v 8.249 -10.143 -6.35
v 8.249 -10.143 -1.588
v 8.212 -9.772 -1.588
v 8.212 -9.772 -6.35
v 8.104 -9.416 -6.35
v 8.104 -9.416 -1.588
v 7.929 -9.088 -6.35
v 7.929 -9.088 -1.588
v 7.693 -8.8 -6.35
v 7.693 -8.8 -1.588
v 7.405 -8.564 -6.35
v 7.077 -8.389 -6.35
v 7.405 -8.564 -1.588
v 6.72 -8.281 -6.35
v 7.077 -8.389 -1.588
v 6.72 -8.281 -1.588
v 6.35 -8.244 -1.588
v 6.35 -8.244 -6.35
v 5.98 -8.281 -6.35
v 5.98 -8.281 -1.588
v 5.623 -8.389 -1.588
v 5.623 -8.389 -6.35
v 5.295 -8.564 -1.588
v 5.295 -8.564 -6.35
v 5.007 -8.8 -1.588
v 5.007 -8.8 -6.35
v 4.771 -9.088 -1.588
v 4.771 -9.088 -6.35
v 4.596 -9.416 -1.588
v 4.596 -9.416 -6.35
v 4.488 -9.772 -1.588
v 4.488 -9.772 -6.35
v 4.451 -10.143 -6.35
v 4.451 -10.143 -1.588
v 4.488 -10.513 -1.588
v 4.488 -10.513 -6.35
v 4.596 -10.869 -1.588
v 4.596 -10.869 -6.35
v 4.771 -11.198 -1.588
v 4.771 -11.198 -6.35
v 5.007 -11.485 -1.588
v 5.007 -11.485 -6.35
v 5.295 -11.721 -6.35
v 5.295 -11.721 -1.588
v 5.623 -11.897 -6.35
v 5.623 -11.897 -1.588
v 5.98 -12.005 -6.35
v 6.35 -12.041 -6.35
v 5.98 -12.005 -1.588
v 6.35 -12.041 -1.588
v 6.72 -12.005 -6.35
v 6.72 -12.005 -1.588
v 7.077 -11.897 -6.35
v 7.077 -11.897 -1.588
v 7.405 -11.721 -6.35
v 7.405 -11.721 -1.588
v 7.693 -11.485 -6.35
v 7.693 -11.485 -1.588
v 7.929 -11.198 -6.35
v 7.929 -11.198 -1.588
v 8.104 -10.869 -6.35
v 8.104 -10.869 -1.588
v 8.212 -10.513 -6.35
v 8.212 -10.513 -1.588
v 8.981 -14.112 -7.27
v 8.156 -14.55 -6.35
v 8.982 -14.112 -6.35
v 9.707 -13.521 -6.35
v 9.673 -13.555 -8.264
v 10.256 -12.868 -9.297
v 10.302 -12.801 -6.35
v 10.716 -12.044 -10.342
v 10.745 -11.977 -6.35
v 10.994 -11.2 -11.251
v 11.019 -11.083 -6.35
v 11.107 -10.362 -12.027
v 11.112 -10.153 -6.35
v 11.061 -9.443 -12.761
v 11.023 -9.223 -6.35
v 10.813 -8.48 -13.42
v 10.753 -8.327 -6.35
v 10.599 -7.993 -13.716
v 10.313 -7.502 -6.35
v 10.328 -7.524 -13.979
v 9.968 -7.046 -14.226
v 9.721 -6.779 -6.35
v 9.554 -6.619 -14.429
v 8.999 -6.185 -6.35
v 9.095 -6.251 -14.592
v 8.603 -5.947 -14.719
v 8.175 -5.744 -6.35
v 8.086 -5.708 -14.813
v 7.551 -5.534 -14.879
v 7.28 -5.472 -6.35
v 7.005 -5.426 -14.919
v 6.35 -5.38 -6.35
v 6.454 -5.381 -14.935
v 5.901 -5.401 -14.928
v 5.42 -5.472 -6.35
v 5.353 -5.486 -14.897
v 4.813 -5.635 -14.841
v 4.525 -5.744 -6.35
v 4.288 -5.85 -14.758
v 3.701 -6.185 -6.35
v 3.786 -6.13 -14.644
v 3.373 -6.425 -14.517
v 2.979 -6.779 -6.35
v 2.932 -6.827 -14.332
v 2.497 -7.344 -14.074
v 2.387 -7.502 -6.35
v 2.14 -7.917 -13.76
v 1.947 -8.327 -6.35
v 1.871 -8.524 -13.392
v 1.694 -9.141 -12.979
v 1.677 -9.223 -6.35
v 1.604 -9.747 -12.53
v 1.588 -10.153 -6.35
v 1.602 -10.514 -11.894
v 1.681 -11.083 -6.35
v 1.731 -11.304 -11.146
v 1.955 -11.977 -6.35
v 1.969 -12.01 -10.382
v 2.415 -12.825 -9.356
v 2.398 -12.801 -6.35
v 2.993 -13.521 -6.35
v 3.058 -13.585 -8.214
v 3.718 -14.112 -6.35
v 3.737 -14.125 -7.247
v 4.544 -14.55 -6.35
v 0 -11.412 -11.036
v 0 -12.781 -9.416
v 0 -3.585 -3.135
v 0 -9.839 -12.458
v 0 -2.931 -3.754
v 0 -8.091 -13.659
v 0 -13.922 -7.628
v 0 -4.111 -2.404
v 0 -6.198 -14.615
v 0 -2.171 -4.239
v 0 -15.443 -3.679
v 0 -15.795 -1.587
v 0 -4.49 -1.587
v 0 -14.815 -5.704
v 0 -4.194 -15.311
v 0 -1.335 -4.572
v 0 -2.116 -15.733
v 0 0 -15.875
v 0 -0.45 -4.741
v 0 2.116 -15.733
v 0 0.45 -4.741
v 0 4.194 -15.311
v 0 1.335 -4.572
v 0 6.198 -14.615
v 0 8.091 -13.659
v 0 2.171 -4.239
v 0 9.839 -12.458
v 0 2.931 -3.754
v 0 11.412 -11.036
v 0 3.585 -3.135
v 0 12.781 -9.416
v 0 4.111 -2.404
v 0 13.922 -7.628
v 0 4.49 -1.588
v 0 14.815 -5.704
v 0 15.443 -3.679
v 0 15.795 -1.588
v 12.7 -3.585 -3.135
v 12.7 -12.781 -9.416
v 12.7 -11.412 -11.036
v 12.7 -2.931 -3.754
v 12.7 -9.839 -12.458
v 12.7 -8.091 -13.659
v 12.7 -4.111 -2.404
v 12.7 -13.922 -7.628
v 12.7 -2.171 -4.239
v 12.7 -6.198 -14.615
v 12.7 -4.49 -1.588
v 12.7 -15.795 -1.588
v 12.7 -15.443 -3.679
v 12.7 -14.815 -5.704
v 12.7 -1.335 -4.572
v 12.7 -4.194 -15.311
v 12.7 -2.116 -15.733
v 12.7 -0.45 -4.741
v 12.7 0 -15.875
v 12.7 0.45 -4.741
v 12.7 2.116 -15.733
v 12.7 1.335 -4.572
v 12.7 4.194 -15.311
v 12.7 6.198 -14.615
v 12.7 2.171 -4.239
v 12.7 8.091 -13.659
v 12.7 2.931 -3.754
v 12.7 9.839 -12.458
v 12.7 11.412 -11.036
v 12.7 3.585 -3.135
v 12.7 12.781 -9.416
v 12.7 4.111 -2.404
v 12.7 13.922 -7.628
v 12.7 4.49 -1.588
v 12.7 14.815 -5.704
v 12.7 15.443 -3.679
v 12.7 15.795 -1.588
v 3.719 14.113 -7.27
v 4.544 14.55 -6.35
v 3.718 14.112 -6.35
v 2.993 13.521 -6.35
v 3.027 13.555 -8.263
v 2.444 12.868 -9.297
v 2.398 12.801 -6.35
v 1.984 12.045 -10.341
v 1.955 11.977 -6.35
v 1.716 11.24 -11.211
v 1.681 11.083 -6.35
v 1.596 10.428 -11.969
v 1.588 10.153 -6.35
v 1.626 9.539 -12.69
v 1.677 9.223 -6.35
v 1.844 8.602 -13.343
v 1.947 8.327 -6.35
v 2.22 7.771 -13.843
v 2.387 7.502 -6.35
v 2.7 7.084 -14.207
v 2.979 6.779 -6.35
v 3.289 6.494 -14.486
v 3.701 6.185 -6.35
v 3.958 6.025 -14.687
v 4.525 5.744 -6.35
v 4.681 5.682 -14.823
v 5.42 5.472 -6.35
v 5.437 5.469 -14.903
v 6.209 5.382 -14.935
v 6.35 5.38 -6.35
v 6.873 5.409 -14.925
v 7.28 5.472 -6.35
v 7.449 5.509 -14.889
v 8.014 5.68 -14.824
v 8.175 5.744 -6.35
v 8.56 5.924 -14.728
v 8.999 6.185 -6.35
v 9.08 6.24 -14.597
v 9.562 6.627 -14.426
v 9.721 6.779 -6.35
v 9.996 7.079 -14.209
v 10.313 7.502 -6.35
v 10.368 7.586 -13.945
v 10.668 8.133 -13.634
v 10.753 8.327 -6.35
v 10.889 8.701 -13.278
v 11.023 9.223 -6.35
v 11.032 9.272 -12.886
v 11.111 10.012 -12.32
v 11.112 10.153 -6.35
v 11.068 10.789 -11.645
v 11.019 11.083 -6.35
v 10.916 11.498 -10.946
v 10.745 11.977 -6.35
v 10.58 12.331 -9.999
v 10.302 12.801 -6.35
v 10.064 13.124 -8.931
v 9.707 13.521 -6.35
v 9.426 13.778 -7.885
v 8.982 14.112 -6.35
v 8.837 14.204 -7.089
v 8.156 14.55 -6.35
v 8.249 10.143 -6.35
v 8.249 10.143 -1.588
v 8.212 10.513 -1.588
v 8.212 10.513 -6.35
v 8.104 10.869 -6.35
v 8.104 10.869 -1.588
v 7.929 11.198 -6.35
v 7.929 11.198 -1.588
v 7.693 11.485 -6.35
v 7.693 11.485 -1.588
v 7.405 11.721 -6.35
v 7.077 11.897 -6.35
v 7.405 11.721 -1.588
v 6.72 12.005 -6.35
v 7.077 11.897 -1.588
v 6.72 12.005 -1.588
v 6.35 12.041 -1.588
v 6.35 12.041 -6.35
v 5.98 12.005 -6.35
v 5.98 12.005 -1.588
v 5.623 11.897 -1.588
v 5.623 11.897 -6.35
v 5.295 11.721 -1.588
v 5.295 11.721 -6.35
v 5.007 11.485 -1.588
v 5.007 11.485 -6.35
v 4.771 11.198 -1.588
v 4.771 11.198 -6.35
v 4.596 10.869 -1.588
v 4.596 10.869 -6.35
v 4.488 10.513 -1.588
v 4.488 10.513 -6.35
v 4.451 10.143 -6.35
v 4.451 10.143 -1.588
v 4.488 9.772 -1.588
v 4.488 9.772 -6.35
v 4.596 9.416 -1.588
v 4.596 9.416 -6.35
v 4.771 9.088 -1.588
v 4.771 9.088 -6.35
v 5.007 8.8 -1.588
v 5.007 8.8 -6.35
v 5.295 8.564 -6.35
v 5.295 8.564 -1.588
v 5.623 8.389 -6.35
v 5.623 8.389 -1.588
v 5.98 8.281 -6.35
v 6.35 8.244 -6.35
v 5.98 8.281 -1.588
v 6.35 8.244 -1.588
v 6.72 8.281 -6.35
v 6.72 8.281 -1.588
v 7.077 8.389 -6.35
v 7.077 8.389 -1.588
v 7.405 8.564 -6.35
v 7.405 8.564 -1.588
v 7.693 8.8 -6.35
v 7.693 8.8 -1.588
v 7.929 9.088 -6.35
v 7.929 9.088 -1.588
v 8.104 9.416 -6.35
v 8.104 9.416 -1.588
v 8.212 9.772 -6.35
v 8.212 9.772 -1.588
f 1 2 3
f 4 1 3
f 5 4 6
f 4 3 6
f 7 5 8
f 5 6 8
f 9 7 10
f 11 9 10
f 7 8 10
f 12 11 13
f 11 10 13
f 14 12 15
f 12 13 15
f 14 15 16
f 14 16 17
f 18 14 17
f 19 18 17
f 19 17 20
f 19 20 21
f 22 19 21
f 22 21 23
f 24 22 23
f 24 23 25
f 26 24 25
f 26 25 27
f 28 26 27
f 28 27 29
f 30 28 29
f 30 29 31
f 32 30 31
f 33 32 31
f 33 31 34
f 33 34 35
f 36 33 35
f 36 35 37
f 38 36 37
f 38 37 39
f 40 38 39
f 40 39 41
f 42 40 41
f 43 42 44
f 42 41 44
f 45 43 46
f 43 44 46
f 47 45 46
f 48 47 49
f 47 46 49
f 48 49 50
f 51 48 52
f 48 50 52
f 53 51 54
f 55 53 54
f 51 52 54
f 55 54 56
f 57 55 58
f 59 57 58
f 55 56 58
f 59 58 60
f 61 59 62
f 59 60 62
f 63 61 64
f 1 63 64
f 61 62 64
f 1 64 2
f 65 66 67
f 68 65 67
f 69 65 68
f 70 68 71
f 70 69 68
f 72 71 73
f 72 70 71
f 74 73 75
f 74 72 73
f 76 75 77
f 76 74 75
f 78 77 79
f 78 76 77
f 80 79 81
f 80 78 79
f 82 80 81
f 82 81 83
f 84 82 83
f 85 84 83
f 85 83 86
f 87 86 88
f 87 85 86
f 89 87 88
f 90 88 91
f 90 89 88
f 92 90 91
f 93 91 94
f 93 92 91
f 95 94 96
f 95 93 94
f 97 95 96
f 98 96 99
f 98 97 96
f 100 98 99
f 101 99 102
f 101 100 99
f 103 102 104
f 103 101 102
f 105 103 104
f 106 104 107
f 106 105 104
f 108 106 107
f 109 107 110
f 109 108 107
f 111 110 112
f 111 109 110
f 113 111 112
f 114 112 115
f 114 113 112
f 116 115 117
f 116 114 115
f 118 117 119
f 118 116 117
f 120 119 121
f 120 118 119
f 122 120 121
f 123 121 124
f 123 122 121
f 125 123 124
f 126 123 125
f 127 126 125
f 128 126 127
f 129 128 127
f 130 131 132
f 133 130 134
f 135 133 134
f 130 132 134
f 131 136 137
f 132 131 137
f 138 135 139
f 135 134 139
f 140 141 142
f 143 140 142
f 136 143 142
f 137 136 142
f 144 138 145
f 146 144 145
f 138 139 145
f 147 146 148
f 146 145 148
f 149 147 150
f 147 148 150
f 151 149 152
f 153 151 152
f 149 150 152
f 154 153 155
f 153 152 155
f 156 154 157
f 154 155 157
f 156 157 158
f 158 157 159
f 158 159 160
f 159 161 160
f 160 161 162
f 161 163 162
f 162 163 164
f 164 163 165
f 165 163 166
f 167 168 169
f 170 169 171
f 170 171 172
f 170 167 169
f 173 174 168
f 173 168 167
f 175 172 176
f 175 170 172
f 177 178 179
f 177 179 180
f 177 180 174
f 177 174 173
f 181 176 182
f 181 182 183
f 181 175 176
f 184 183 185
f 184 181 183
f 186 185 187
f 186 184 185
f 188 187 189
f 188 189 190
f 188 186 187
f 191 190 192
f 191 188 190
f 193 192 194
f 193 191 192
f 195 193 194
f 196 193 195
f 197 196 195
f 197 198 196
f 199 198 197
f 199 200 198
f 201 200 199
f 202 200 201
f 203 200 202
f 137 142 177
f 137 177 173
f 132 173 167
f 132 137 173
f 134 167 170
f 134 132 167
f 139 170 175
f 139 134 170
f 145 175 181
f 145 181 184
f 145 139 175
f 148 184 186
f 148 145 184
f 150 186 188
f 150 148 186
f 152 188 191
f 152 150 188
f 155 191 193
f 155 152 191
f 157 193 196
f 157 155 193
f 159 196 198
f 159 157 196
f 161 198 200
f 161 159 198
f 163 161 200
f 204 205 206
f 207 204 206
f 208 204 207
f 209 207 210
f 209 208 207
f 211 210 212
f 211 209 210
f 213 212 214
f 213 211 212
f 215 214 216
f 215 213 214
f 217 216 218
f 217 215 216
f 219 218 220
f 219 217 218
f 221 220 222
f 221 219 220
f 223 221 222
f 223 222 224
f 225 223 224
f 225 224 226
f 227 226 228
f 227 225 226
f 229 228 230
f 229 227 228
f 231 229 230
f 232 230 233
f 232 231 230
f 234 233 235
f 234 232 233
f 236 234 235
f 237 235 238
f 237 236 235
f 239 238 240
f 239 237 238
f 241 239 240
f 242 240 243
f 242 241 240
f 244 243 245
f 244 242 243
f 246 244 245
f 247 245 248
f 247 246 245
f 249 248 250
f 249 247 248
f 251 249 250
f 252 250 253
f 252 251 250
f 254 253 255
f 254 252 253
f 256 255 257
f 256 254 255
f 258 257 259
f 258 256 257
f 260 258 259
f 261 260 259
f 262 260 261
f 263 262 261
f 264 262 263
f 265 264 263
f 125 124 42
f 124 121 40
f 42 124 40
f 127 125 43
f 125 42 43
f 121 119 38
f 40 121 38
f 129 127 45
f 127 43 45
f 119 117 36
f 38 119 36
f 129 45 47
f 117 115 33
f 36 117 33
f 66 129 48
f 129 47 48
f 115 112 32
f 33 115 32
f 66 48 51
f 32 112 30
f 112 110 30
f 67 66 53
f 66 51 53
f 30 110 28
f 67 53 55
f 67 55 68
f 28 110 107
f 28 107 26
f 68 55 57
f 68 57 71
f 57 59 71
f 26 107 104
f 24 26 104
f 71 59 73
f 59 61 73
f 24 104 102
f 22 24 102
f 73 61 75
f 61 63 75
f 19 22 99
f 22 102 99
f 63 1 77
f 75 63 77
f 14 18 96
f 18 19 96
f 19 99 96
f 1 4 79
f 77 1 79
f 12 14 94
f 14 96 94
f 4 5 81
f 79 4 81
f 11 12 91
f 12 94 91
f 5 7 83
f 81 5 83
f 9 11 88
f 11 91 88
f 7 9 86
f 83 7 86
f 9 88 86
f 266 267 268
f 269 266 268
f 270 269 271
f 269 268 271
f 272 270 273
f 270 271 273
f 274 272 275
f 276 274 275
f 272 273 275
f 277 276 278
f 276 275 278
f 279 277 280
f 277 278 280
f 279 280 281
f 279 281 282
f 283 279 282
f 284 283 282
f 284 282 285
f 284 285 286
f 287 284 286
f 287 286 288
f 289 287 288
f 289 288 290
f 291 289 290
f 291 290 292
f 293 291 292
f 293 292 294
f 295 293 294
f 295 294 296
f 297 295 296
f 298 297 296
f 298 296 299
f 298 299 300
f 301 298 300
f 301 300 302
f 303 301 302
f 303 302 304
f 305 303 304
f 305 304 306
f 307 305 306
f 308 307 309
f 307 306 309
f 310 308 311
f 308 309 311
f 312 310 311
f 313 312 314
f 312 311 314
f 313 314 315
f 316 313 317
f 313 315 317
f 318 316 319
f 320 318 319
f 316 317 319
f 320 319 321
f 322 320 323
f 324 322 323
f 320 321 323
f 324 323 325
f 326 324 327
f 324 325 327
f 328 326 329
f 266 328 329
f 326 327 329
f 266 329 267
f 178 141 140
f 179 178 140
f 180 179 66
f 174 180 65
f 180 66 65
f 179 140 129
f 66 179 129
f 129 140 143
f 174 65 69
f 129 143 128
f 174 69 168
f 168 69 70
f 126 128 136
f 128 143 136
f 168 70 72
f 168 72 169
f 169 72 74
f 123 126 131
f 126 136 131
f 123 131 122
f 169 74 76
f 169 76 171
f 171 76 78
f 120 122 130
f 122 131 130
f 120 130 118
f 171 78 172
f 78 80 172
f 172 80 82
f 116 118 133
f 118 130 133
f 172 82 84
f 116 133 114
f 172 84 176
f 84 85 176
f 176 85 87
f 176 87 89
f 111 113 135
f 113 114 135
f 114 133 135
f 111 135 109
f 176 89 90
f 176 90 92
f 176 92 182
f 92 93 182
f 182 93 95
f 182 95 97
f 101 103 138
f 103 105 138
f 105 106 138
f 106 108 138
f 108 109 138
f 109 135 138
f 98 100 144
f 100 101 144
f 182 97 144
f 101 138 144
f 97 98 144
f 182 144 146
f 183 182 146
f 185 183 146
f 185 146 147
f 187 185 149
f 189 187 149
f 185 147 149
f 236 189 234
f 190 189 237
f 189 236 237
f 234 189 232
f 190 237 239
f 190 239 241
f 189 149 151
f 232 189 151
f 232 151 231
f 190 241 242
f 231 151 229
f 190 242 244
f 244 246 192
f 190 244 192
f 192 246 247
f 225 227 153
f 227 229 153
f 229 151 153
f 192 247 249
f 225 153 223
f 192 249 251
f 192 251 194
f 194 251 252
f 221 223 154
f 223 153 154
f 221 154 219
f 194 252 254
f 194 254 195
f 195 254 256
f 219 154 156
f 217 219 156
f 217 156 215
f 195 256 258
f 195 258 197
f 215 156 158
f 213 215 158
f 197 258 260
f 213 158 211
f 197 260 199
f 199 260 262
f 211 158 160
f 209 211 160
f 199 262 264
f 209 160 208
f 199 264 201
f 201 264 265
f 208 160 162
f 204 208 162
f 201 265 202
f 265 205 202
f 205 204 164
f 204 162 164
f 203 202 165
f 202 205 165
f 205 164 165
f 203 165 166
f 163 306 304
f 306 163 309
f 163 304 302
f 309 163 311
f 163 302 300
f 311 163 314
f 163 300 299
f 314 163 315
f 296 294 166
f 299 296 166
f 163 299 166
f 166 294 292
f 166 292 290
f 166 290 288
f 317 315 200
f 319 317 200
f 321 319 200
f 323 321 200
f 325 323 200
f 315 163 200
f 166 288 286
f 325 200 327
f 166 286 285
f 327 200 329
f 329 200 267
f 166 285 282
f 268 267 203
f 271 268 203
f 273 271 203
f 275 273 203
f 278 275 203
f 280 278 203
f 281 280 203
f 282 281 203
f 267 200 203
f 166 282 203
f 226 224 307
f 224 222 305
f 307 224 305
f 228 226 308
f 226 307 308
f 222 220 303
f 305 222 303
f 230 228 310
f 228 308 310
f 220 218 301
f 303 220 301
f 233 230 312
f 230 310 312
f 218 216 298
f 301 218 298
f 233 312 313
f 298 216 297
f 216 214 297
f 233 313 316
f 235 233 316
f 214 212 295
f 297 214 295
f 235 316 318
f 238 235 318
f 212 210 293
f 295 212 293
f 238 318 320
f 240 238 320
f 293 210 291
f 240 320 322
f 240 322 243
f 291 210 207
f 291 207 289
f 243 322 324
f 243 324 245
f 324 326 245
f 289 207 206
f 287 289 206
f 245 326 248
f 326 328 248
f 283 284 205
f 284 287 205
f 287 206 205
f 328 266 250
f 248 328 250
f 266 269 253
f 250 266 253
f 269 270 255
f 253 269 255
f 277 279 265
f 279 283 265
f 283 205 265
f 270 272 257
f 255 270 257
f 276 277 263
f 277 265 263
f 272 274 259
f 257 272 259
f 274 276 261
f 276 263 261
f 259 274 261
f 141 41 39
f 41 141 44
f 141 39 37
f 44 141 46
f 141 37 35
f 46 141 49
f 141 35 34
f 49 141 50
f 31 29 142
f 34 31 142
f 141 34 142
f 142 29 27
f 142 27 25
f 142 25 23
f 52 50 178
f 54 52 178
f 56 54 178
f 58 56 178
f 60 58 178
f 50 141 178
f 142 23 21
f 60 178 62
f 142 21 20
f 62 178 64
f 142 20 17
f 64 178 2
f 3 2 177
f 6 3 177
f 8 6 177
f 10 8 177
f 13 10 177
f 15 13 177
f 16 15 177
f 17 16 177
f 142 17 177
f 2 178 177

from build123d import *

# Parameters (mm, degrees)
F0_R     = 15.875
F0_R_2   = 4.7625
F1_DEPTH = 12.7
F2_W     = 39.643920958
F2_H     = 19.4333904848
F3_DEPTH = 12.701
F4_R     = 1.89865
F5_DEPTH = 14.2885
F7_R     = 4.7625
F8_DEPTH = 9.525


# Not quite as in the source:
# - a length typed as a fraction of an inch, garbled in the dataset ("3 / 203.2 mm" for 3/8 in), is restored


with BuildPart() as f1:
    # F0 (on Right) → F1 (new body)
    with BuildSketch(Plane.YZ):
        Circle(F0_R)
        Circle(F0_R_2, mode=Mode.SUBTRACT)
    extrude(amount=F1_DEPTH)

    # F2 (on face) → F3 (cut, through all)
    with BuildSketch(Plane.YZ.offset(12.7)):
        with Locations((-1.8631611019, 8.1291952424)):
            Rectangle(F2_W, F2_H)
    extrude(amount=-F3_DEPTH, mode=Mode.SUBTRACT)

    # F4 (on face) → F5 (cut, through all)
    with BuildSketch(Plane.XY.offset(-1.5875)):
        with Locations((6.35, -10.1427768123)):
            Circle(F4_R)
        with Locations((6.35, 10.1427768123)):
            Circle(F4_R)
    extrude(amount=-F5_DEPTH, mode=Mode.SUBTRACT)

    # F7 (on offset) → F8 (cut)
    with BuildSketch(Plane.XY.offset(-15.875)):
        with Locations((6.35, 10.1427768123)):
            Circle(F7_R)
        with Locations((6.35, -10.1427768123)):
            Circle(F7_R)
    extrude(amount=F8_DEPTH, mode=Mode.SUBTRACT)


solid = f1.part
